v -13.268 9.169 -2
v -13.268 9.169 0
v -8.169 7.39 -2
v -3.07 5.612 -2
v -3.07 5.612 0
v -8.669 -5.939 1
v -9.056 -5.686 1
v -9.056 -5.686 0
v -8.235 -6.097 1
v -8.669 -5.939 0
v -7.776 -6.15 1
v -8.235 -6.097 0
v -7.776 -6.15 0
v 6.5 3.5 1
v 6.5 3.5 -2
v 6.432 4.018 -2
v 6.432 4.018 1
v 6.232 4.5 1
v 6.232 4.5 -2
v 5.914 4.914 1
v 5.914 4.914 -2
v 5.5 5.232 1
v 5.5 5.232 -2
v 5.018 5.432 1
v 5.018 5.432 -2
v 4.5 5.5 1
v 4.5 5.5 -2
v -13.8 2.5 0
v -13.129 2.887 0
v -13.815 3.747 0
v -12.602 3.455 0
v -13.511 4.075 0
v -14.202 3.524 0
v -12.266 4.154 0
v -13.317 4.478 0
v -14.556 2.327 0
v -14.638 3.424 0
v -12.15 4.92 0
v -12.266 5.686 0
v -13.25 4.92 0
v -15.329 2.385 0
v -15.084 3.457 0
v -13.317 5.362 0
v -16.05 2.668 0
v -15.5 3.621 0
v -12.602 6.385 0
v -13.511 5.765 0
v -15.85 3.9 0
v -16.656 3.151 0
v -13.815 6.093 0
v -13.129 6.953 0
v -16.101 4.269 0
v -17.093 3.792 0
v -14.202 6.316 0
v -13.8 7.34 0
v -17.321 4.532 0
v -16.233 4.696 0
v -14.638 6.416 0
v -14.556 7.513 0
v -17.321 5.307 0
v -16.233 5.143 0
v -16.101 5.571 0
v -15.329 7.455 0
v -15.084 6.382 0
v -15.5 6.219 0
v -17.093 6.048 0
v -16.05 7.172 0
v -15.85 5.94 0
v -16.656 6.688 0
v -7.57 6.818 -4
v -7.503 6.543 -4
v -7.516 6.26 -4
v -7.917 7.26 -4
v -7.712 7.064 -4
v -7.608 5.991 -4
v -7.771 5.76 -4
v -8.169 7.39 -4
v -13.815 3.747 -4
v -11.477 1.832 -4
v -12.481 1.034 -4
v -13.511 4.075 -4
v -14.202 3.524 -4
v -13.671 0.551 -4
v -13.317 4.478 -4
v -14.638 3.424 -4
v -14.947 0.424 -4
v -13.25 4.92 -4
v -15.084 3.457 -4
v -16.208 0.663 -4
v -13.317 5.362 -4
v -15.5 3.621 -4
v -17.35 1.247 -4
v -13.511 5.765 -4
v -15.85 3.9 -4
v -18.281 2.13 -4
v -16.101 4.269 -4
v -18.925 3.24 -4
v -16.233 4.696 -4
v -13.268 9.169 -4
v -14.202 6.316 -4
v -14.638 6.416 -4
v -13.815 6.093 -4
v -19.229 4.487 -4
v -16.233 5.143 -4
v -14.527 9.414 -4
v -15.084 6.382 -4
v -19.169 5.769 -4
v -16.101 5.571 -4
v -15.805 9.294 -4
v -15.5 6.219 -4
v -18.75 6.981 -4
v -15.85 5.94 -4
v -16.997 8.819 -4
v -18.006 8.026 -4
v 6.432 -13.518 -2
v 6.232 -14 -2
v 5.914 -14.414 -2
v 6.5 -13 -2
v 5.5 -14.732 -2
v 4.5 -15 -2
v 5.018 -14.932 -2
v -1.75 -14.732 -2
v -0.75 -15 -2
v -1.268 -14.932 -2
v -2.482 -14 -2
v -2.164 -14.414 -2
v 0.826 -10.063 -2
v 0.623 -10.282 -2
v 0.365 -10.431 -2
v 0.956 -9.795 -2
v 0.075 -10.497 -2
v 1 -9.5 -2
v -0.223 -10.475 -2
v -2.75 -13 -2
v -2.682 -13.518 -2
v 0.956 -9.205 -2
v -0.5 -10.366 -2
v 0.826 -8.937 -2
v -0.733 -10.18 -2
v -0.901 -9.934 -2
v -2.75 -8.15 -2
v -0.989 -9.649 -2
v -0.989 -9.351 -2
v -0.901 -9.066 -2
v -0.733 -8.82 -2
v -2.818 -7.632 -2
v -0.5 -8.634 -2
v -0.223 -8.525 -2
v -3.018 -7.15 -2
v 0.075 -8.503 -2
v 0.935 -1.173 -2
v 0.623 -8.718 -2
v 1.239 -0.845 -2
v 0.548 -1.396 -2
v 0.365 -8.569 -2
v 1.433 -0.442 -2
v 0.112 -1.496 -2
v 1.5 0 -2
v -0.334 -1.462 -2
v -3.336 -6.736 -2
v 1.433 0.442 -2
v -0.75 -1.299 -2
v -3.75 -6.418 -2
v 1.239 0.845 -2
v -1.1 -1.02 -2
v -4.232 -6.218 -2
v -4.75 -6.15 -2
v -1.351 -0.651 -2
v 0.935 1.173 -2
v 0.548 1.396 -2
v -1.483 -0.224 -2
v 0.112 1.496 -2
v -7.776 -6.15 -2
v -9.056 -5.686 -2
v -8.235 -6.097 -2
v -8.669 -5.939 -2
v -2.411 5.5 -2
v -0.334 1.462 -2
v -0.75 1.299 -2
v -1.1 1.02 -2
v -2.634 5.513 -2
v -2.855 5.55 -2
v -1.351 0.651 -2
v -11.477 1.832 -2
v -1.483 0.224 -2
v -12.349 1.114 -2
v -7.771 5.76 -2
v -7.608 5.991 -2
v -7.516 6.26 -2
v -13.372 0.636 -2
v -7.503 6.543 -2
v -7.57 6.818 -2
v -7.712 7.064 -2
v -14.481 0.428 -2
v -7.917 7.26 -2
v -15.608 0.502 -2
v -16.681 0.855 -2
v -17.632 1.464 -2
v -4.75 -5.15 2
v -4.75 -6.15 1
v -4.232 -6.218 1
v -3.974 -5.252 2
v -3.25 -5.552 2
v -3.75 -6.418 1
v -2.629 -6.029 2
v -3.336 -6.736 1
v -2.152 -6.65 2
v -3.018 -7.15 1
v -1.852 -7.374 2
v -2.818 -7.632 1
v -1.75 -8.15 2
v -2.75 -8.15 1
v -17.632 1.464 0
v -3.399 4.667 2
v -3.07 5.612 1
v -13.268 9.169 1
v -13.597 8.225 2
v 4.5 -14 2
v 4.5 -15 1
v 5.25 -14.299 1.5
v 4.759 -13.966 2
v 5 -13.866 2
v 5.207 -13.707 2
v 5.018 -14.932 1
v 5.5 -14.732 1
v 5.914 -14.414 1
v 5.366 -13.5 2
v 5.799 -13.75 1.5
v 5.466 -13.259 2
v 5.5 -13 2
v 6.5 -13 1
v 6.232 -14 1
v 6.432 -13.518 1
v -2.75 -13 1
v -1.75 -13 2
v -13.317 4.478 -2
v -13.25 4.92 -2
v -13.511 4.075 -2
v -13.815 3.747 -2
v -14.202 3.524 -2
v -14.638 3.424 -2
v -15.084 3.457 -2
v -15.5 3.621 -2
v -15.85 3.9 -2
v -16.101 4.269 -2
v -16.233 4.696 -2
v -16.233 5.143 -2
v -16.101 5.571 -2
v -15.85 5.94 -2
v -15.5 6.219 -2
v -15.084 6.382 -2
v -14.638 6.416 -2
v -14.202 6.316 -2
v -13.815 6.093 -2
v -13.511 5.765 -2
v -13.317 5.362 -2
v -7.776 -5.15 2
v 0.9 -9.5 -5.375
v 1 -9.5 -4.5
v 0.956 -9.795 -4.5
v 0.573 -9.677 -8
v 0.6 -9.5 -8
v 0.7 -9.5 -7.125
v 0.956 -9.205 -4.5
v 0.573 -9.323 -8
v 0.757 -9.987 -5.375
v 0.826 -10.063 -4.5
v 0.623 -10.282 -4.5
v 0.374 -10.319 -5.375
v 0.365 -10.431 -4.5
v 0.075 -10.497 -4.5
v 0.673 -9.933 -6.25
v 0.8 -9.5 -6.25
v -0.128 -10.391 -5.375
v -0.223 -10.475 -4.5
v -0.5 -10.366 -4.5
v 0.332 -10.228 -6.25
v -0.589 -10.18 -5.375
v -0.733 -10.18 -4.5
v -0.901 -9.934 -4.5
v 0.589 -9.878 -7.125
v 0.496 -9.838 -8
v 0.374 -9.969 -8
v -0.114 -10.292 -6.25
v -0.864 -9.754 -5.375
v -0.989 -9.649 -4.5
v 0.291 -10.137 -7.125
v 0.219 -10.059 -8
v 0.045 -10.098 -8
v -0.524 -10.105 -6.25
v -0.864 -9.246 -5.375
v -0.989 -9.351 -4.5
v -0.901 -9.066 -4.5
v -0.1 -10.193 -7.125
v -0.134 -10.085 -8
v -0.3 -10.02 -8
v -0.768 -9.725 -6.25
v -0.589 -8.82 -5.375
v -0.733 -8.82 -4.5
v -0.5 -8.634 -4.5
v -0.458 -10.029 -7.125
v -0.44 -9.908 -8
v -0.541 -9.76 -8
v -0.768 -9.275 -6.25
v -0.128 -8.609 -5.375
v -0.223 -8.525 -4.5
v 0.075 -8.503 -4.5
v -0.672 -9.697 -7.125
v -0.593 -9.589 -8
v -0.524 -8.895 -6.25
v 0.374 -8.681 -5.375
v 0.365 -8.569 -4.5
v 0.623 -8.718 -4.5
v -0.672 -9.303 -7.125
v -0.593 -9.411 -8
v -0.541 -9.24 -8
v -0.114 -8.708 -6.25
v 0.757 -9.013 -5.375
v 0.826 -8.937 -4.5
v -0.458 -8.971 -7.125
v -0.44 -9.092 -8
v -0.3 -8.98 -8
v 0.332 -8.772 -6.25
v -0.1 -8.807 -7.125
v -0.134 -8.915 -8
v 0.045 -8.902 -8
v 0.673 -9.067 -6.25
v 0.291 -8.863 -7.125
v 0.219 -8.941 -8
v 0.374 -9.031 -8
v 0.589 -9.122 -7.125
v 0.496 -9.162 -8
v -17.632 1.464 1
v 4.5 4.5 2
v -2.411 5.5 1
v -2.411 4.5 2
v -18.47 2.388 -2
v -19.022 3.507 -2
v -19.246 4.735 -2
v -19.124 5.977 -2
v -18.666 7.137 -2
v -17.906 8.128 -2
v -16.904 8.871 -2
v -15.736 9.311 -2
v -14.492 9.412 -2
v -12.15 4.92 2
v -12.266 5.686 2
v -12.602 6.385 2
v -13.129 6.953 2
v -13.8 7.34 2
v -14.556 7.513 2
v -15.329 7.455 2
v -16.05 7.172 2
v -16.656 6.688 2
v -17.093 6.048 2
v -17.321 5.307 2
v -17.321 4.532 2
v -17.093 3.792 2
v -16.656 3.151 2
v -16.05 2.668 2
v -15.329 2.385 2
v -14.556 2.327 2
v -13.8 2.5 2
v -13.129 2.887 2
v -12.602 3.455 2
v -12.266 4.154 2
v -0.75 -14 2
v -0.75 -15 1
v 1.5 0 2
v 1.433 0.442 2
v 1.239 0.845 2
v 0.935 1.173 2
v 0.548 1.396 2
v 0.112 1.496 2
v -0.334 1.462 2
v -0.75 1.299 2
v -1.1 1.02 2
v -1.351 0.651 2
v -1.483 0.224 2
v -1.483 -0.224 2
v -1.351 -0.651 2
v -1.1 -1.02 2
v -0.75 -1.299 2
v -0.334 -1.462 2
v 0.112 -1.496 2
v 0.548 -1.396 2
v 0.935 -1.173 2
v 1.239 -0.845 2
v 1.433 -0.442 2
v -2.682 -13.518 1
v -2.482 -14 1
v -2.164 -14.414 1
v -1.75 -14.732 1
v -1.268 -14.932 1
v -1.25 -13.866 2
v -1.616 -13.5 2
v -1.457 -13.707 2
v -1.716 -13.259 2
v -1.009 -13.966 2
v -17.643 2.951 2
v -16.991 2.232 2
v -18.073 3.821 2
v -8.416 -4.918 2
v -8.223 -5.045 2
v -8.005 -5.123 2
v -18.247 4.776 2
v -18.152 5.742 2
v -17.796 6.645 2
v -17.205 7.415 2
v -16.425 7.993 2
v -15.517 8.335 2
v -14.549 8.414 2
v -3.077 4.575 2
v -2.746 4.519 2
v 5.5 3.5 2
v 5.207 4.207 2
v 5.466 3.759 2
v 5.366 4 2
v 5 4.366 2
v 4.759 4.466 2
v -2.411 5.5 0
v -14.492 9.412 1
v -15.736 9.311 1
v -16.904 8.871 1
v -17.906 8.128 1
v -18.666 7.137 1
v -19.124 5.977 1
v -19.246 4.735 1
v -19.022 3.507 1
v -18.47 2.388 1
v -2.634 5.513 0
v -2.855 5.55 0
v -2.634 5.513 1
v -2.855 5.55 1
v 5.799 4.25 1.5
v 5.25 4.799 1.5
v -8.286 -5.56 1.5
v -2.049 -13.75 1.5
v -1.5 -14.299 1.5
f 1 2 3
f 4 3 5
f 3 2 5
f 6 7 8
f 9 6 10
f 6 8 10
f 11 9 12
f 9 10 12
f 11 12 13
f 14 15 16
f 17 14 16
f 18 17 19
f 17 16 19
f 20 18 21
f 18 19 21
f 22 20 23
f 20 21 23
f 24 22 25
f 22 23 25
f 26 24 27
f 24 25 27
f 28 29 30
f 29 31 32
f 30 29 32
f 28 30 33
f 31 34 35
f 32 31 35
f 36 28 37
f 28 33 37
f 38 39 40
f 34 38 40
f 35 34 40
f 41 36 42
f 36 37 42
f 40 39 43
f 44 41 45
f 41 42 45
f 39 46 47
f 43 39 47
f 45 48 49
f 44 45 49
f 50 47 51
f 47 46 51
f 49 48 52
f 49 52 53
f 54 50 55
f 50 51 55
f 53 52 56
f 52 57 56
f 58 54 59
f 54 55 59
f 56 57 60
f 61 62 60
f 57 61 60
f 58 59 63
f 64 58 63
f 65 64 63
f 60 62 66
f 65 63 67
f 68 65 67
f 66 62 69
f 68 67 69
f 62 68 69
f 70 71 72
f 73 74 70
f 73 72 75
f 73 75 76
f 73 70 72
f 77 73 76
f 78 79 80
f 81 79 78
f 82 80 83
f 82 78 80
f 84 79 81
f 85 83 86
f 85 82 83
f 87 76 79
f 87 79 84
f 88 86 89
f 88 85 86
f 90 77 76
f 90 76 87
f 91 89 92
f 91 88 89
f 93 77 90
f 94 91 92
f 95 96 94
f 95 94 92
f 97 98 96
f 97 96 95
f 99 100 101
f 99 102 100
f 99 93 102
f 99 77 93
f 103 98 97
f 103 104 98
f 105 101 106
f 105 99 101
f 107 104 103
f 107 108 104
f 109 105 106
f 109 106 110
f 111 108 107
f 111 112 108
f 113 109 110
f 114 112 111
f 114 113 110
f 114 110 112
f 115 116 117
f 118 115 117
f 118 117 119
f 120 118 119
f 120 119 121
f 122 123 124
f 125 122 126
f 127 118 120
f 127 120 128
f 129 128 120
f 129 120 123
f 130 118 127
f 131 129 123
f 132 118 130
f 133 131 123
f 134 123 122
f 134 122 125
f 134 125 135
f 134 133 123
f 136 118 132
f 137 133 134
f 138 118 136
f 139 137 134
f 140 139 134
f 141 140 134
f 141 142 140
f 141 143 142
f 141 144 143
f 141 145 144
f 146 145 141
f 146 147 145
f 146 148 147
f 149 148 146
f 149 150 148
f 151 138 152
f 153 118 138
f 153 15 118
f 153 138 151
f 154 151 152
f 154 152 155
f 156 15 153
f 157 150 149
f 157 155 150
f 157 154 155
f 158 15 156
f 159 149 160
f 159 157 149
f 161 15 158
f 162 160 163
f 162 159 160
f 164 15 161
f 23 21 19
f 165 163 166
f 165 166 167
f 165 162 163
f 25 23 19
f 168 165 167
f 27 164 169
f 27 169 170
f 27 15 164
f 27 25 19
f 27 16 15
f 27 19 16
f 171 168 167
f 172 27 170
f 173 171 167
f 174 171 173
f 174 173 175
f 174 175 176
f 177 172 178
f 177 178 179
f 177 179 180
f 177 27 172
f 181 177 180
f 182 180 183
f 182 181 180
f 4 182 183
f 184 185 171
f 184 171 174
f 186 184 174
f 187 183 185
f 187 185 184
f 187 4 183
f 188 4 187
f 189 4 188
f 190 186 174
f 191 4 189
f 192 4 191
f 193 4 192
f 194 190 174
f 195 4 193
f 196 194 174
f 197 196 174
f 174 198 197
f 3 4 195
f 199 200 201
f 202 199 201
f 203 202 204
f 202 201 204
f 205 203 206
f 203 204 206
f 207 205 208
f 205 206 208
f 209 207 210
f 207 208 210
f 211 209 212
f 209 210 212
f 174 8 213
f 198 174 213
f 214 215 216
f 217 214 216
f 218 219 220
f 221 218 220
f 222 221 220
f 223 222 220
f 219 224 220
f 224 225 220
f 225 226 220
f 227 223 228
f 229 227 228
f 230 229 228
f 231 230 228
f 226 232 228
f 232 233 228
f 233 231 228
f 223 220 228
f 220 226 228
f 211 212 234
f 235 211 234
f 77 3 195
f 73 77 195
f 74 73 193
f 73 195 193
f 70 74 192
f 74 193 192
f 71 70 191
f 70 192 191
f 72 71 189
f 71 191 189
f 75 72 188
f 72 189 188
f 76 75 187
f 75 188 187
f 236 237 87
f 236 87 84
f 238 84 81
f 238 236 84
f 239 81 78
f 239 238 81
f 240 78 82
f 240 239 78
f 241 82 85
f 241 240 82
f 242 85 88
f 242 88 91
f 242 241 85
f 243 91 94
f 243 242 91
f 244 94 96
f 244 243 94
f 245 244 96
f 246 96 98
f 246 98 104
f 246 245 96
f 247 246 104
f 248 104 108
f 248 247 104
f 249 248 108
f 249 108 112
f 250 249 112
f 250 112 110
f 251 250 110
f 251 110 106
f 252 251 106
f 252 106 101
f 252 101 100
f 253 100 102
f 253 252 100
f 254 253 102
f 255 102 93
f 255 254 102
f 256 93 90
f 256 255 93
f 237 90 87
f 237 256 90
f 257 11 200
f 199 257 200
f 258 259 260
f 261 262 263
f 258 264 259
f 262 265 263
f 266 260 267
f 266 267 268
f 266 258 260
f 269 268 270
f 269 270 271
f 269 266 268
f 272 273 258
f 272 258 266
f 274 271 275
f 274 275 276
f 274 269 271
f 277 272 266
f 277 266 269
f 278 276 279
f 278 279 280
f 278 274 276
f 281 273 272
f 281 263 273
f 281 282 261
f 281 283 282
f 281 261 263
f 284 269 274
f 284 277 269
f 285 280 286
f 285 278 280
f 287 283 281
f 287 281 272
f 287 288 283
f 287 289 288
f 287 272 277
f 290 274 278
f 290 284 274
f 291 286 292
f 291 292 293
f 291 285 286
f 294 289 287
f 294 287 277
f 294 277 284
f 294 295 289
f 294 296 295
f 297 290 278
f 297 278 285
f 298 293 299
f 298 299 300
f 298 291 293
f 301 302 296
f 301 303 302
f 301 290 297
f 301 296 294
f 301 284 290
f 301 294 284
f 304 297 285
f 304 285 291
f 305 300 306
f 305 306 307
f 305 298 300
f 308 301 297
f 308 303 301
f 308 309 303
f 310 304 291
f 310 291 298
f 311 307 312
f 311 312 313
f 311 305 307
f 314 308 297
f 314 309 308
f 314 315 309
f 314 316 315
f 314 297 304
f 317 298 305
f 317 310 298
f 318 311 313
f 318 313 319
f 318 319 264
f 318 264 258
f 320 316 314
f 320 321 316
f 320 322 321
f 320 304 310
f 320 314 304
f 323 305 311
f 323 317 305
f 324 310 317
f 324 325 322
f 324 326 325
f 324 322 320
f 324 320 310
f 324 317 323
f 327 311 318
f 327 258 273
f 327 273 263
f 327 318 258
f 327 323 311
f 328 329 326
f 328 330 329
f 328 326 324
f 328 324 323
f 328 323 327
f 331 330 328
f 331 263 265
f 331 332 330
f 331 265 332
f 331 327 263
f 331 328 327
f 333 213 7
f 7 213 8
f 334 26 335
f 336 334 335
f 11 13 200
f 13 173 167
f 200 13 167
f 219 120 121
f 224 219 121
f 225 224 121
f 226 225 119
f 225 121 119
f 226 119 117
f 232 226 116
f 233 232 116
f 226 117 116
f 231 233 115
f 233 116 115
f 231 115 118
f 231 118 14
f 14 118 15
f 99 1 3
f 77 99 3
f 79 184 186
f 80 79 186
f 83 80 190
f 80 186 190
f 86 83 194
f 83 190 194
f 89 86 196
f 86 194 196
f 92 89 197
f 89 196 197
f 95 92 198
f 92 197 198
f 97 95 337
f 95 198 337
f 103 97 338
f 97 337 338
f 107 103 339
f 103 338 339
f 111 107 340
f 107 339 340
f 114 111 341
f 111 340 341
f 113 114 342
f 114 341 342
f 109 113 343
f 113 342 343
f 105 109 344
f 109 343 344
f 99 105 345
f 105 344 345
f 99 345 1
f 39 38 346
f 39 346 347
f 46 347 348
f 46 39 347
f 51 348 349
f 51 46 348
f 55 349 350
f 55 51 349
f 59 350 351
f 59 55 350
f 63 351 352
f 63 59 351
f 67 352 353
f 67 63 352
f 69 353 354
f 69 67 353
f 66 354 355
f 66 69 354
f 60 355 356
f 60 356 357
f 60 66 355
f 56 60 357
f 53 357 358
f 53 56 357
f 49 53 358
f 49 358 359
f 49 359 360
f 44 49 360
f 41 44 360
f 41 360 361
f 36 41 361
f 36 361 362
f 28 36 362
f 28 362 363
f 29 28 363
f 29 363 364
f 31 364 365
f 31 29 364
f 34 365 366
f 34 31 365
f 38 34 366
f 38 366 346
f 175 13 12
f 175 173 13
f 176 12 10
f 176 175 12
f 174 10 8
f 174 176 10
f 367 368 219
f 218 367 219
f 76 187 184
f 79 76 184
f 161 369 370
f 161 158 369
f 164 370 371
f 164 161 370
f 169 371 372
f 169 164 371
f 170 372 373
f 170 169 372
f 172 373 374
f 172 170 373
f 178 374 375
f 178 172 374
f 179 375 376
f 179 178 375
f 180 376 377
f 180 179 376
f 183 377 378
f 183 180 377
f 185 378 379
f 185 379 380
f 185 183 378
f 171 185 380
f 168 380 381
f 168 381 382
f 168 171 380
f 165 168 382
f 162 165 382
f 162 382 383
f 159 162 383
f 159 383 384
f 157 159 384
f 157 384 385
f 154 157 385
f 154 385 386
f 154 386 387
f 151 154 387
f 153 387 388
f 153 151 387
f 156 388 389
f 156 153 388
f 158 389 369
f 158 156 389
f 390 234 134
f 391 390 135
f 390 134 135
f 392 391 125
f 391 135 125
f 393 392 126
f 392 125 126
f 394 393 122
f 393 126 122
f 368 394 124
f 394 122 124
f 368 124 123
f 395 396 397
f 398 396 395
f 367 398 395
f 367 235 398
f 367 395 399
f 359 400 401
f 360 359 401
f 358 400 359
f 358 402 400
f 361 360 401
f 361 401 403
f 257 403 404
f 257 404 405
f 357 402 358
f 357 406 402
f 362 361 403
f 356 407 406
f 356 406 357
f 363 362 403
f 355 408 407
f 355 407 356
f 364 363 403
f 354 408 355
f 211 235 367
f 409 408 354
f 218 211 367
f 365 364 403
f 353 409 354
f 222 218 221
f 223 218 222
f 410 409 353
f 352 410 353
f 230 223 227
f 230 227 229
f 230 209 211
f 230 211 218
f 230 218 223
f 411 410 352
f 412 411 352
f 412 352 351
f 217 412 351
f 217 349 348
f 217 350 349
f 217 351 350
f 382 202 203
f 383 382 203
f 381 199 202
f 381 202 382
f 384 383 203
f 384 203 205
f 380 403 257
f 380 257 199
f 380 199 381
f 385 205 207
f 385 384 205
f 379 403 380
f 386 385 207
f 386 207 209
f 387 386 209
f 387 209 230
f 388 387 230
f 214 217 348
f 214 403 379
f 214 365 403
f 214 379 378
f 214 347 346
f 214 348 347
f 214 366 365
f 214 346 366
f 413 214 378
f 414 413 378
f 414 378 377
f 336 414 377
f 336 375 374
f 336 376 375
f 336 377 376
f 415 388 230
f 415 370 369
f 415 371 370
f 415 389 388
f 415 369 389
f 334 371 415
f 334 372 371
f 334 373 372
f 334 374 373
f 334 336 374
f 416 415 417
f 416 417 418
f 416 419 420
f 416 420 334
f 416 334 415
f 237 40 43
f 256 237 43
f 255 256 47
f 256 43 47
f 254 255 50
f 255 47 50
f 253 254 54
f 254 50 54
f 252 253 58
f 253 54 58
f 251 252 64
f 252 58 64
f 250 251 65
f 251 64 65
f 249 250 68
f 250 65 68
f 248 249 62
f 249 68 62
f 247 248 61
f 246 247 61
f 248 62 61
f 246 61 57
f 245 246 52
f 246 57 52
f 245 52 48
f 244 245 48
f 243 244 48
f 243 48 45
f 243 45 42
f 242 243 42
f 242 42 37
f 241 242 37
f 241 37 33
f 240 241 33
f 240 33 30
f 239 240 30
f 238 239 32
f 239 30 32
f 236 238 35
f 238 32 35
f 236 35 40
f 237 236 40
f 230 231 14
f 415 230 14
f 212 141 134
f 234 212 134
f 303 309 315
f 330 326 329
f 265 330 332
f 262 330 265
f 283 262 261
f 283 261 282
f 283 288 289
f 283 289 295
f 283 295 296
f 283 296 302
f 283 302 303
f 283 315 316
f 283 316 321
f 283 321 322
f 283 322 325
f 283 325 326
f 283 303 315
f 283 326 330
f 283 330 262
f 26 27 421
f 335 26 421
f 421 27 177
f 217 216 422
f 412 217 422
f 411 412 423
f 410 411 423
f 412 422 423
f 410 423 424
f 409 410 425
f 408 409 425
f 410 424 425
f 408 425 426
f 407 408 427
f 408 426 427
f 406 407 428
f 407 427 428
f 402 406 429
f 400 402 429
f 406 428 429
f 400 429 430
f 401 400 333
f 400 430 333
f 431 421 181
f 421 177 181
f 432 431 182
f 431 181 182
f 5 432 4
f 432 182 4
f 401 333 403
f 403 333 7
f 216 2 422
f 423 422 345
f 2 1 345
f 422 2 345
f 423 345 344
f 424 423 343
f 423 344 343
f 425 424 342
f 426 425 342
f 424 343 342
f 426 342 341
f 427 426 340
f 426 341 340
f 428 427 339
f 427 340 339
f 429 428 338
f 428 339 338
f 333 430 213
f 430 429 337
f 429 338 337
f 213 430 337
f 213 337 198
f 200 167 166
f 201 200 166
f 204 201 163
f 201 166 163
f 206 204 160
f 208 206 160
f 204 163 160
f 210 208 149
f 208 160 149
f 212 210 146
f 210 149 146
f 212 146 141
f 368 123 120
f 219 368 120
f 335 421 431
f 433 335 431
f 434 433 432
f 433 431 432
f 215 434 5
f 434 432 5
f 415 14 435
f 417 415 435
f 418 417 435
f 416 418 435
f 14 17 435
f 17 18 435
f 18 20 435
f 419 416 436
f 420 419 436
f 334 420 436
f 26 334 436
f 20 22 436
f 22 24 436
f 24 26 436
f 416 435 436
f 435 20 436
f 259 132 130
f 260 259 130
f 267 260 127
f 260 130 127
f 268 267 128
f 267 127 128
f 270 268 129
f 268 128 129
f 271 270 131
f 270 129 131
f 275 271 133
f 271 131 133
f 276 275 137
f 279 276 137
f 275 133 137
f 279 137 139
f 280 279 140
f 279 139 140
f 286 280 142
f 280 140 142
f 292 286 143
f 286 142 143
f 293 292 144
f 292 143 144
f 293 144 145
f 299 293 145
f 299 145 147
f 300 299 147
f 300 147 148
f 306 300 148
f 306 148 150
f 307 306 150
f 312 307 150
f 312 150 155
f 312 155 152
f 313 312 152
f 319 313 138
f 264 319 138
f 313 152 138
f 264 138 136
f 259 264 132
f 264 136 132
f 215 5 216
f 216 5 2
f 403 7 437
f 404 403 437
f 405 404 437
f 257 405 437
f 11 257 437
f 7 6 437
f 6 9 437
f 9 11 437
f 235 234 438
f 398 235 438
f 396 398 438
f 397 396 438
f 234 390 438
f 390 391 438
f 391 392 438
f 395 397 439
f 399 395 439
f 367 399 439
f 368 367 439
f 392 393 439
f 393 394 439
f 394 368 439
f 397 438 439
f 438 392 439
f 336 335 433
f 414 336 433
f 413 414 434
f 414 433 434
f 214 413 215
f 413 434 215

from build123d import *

# Parameters (mm, degrees)
SKETCH1_R           = 1.5
BOSS_EXTRUDE1_DEPTH = 2
FILLET1_R           = 2
SKETCH2_R           = 1.5
SKETCH2_R_2         = 2.6
BOSS_EXTRUDE2_DEPTH = 2
CHAMFER1_SIZE       = 1
SKETCH3_R           = 1
BOSS_EXTRUDE3_DEPTH = 6
CHAMFER2_SIZE       = 3.5
CHAMFER2_SIZE2      = 0.4
SKETCH4_R           = 1.5
BOSS_EXTRUDE4_DEPTH = 2


with BuildPart() as part:
    # Sketch1 → Boss-Extrude1 (new body)
    with BuildSketch(Plane.XY):
        with BuildLine():
            Line((-2.75, -15), (-2.75, -6.15))
            Line((-2.75, -6.15), (-8.5, -6.15))
            Line((-8.5, -6.15), (-17.631690269, 1.463594463))
            ThreePointArc((-17.631690269, 1.463594463), (-18.665645679, 7.137466027), (-13.267909941, 9.168803324))
            Line((-13.267909941, 9.168803324), (-2.75, 5.5))
            Line((-2.75, 5.5), (6.5, 5.5))
            Line((6.5, 5.5), (6.5, -15))
            Line((6.5, -15), (-2.75, -15))
        make_face()
        Circle(SKETCH1_R, mode=Mode.SUBTRACT)
        with Locations((-14.75, 4.919872981)):
            Circle(SKETCH1_R, mode=Mode.SUBTRACT)
    extrude(amount=-BOSS_EXTRUDE1_DEPTH)

    # Fillet1
    fillet1_edges = [part.edges().sort_by_distance(p)[0] for p in [
        (6.5, -15, -1),
        (-2.75, -15, -1),
        (-2.75, -6.15, -1),
        (-8.5, -6.15, -1),
        (-2.75, 5.5, -1),
        (6.5, 5.5, -1),
    ]]
    fillet(fillet1_edges, radius=FILLET1_R)

    # Sketch2 → Boss-Extrude2 (add)
    with BuildSketch(Plane.XY):
        with BuildLine():
            Line((-0.75, -15), (4.5, -15))
            ThreePointArc((4.5, -15), (5.914213562, -14.414213562), (6.5, -13))
            Line((6.5, -13), (6.5, 3.5))
            ThreePointArc((6.5, 3.5), (5.914213562, 4.914213562), (4.5, 5.5))
            Line((4.5, 5.5), (-2.41119514, 5.5))
            ThreePointArc((-2.41119514, 5.5), (-2.745240817, 5.528093946), (-3.069901833, 5.611586514))
            Line((-3.069901833, 5.611586514), (-13.267909941, 9.168803324))
            ThreePointArc((-13.267909941, 9.168803324), (-18.665645679, 7.137466027), (-17.631690269, 1.463594463))
            Line((-17.631690269, 1.463594463), (-9.056369785, -5.686123786))
            ThreePointArc((-9.056369785, -5.686123786), (-8.456703141, -6.030458398), (-7.775618554, -6.15))
            Line((-7.775618554, -6.15), (-4.75, -6.15))
            ThreePointArc((-4.75, -6.15), (-3.335786438, -6.735786438), (-2.75, -8.15))
            Line((-2.75, -8.15), (-2.75, -13))
            ThreePointArc((-2.75, -13), (-2.164213562, -14.414213562), (-0.75, -15))
        make_face()
        Circle(SKETCH2_R, mode=Mode.SUBTRACT)
        with Locations((-14.75, 4.919872981)):
            Circle(SKETCH2_R_2, mode=Mode.SUBTRACT)
    extrude(amount=BOSS_EXTRUDE2_DEPTH)

    # Chamfer1
    chamfer1_edges = [part.edges().sort_by_distance(p)[0] for p in [
        (-2.164213562, -14.414213562, 2),
        (1.875, -15, 2),
        (5.914213562, -14.414213562, 2),
        (6.5, -4.75, 2),
        (5.914213562, 4.914213562, 2),
        (1.04440243, 5.5, 2),
        (-2.745240817, 5.528093946, 2),
        (-8.168905887, 7.390194919, 2),
        (-18.665645679, 7.137466027, 2),
        (-13.344030027, -2.111264661, 2),
        (-8.456703141, -6.030458398, 2),
        (-6.262809277, -6.15, 2),
        (-3.335786438, -6.735786438, 2),
        (-2.75, -10.575, 2),
    ]]
    chamfer(chamfer1_edges, length=CHAMFER1_SIZE)

    # Sketch3 → Boss-Extrude3 (add)
    with BuildSketch(Plane(origin=(0, 0, -2), x_dir=(-1, 0, 0), z_dir=(0, 0, -1))):
        with Locations(Location((0, -9.5, 0), (0, 0, 180))):
            Circle(SKETCH3_R)
    extrude(amount=BOSS_EXTRUDE3_DEPTH)

    # Chamfer2
    chamfer2_edges = [part.edges().sort_by_distance(p)[0] for p in [
        (-1, -9.5, -8),
    ]]
    chamfer2_side = [part.faces().sort_by_distance(p)[0] for p in [
        (-1, -9.5, -5),
    ]]
    chamfer(chamfer2_edges, length=CHAMFER2_SIZE, length2=CHAMFER2_SIZE2, reference=chamfer2_side[0])

    # Sketch4 → Boss-Extrude4 (add)
    with BuildSketch(Plane(origin=(0, 0, -2), x_dir=(-1, 0, 0), z_dir=(0, 0, -1))):
        with BuildLine():
            Line((13.267909941, 9.168803324), (8.168905887, 7.390194919))
            ThreePointArc((8.168905887, 7.390194919), (7.526785431, 6.683135075), (7.770894189, 5.759737426))
            Line((7.770894189, 5.759737426), (11.476857302, 1.831744604))
            ThreePointArc((11.476857302, 1.831744604), (19.121632111, 3.852711939), (13.267909941, 9.168803324))
        make_face()
        with Locations(Location((14.75, 4.919872981, 0), (0, 0, 180))):
            Circle(SKETCH4_R, mode=Mode.SUBTRACT)
    extrude(amount=BOSS_EXTRUDE4_DEPTH)


solid = part.part
